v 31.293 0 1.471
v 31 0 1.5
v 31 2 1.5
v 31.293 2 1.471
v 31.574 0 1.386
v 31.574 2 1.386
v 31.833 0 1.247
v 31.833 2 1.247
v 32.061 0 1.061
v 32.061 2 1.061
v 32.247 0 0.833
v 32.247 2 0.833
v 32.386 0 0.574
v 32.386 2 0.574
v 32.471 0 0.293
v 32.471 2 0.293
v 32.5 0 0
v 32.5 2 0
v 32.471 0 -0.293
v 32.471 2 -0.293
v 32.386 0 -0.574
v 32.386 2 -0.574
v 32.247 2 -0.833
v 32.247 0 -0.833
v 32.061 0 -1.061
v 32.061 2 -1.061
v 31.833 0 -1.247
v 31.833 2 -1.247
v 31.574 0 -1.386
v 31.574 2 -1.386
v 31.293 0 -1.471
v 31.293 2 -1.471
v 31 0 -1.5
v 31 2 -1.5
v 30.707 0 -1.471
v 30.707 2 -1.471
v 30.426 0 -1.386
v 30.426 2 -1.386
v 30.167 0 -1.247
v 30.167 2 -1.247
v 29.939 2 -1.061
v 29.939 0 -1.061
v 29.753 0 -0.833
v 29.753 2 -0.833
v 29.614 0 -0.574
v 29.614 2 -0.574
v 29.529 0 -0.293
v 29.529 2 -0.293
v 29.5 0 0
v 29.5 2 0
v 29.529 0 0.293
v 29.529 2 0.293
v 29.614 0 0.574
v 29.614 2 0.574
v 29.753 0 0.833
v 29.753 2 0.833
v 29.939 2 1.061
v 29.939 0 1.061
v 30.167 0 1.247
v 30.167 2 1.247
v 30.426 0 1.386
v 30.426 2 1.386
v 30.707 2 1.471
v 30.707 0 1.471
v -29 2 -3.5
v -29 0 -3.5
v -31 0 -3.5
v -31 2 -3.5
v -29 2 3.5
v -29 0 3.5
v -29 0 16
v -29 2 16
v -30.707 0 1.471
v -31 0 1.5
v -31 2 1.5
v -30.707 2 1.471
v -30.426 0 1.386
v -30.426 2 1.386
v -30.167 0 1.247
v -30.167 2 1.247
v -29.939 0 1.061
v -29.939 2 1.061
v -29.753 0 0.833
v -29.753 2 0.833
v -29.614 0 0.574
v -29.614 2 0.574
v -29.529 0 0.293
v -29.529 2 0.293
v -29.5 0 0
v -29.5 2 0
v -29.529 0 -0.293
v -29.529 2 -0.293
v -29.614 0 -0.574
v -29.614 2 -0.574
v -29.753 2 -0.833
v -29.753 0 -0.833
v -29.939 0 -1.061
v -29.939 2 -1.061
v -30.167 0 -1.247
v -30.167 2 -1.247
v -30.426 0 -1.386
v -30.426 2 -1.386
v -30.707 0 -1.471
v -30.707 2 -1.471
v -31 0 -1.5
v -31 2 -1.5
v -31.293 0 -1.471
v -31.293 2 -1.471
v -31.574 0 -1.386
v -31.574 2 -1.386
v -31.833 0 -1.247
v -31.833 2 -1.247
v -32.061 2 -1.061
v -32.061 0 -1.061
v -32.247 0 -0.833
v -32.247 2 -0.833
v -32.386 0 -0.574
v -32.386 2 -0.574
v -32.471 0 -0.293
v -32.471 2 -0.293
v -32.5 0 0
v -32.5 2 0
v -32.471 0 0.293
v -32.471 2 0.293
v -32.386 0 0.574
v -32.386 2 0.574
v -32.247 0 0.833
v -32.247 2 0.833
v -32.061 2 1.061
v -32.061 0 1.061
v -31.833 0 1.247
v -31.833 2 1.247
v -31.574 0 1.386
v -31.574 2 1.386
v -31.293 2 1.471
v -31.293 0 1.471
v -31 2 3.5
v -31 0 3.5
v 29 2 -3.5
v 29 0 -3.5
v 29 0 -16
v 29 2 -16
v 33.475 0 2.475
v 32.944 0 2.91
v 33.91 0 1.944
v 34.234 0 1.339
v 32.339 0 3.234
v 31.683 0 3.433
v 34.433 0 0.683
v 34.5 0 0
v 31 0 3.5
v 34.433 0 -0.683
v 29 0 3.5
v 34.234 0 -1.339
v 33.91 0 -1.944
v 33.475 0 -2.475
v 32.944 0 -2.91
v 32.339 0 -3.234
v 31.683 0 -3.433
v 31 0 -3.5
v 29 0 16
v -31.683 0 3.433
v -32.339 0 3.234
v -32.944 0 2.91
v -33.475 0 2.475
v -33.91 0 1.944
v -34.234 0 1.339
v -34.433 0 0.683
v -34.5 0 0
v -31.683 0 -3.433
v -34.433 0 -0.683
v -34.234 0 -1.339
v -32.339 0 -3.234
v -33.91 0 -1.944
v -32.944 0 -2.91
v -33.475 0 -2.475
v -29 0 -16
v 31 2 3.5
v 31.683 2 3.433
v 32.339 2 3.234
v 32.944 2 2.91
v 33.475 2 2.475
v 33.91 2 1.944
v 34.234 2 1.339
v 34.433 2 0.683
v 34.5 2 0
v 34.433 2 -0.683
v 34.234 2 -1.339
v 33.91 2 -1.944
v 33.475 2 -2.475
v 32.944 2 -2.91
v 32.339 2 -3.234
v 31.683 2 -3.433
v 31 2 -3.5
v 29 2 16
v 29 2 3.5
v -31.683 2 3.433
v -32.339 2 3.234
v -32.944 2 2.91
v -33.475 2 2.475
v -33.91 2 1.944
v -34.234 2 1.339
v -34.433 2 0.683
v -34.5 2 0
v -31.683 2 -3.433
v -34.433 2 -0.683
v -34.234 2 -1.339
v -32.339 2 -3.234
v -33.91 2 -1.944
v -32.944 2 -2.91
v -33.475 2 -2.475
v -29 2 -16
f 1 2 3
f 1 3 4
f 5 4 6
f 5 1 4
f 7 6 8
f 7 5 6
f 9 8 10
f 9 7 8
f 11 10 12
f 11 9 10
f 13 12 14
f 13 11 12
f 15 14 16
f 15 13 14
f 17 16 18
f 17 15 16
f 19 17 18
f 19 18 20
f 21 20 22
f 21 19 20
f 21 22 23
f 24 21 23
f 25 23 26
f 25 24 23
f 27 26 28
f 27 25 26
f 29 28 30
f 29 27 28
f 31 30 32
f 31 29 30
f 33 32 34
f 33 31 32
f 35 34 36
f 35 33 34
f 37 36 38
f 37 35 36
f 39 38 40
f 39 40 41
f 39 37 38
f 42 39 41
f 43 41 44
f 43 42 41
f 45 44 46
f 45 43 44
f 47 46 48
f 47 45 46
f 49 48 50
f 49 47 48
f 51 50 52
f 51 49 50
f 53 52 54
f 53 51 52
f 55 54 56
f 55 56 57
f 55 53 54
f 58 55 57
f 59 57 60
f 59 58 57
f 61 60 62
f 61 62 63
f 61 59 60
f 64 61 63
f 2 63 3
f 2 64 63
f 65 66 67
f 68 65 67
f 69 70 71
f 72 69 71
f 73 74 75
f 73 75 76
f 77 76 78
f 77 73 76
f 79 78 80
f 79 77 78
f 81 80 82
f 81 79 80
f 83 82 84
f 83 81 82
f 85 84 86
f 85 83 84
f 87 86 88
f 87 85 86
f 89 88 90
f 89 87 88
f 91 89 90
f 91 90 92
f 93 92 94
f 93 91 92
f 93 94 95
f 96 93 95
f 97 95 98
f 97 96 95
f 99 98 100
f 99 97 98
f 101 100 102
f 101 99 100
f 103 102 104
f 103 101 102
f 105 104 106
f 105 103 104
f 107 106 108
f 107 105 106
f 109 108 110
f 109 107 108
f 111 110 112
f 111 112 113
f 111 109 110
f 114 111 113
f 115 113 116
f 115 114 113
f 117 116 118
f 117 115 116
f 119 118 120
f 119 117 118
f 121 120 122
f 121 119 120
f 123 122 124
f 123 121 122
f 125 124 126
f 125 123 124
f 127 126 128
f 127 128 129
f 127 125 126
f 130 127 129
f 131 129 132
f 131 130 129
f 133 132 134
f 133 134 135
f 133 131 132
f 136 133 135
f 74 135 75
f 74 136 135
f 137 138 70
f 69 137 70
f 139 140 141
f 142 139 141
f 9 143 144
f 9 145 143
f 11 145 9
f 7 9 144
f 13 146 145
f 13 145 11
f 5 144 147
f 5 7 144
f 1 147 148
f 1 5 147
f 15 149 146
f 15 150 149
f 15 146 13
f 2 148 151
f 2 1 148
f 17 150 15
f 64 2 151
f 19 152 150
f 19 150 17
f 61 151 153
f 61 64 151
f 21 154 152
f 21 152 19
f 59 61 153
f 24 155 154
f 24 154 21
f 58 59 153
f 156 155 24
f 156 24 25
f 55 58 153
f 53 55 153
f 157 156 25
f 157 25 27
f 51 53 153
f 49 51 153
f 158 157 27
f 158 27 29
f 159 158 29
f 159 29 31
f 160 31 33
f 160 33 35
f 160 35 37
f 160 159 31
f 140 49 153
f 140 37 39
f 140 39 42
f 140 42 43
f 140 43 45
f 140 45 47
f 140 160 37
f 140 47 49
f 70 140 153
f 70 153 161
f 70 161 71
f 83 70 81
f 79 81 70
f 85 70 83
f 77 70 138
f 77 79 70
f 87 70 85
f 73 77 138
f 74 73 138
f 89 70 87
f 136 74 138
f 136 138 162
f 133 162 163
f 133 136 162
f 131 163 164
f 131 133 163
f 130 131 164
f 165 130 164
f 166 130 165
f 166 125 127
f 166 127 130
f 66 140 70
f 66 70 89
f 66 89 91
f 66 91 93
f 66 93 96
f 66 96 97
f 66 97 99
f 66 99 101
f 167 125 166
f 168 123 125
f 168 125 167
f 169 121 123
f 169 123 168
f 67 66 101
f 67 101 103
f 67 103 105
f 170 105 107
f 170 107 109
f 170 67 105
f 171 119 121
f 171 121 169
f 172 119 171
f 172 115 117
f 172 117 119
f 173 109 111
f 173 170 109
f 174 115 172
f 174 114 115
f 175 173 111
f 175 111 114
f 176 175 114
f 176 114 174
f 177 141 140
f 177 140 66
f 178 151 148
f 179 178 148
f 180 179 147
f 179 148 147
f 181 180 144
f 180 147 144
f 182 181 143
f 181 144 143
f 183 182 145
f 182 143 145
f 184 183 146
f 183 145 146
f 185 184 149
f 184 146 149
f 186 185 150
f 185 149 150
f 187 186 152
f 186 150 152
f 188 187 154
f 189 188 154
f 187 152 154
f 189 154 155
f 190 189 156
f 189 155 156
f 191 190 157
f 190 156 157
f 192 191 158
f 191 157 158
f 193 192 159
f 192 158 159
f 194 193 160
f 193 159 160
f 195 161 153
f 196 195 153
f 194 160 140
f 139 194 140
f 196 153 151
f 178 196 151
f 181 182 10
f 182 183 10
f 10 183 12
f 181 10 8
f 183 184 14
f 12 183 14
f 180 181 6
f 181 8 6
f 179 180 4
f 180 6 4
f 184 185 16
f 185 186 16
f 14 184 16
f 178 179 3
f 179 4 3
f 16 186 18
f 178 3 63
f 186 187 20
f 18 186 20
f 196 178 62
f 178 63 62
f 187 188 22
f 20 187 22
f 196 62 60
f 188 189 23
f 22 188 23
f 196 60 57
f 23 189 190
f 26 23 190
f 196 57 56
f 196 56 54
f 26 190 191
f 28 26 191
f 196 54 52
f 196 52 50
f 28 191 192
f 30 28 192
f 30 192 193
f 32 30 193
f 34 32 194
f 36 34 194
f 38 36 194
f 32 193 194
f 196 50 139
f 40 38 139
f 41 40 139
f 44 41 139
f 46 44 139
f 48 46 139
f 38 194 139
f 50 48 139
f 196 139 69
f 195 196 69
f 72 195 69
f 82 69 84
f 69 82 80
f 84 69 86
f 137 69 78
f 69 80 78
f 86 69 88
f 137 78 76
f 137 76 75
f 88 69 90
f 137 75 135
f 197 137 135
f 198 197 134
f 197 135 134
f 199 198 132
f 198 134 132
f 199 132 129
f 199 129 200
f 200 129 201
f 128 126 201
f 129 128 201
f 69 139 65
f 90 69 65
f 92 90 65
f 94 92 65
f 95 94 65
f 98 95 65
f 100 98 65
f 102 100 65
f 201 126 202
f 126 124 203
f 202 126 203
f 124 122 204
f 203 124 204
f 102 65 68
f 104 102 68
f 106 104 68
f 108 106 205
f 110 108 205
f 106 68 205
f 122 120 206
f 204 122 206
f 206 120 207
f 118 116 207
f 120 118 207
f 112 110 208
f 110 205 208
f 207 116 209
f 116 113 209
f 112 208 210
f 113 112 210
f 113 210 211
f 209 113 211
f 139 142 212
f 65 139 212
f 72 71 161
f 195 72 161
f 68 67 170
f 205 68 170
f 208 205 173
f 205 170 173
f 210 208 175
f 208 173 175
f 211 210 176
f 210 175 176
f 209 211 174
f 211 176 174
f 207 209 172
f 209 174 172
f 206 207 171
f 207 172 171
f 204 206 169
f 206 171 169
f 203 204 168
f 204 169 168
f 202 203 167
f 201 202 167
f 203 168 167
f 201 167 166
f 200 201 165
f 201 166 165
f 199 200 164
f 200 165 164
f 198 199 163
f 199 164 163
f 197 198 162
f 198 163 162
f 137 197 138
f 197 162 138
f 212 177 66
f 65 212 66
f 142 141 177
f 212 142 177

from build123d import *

# Parameters (mm, degrees)
CROQUIS1_R              = 1.5
SALIENTE_EXTRUIR1_DEPTH = 2


with BuildPart() as part:
    # Croquis1 → Saliente-Extruir1 (new body)
    # profile 1 of 3: a face of its own
    with BuildSketch(Plane(origin=(0, 0, 0), x_dir=(1, 0, 0), z_dir=(0, 1, 0))):
        Polygon((-29, -16), (-29, 0), (-29, 16), (0, 16), (29, 16), (29, 0), (29, -16), (0, -16), align=None)
    # profile 2 of 3: a face of its own
    with BuildSketch(Plane(origin=(0, 0, 0), x_dir=(1, 0, 0), z_dir=(0, 1, 0))):
        with BuildLine():
            Line((31, 3.5), (29, 3.5))
            Line((29, 3.5), (29, 0))
            Line((29, 0), (29, -3.5))
            Line((29, -3.5), (31, -3.5))
            ThreePointArc((31, -3.5), (34.5, 0), (31, 3.5))
        make_face()
        with Locations(Location((31, 0, 0), (0, 0, 270))):
            Circle(CROQUIS1_R, mode=Mode.SUBTRACT)
    # profile 3 of 3: a face of its own
    with BuildSketch(Plane(origin=(0, 0, 0), x_dir=(1, 0, 0), z_dir=(0, 1, 0))):
        with BuildLine():
            Line((-29, -3.5), (-29, 0))
            Line((-29, 0), (-29, 3.5))
            Line((-29, 3.5), (-31, 3.5))
            ThreePointArc((-31, 3.5), (-34.5, 0), (-31, -3.5))
            Line((-31, -3.5), (-29, -3.5))
        make_face()
        with Locations(Location((-31, 0, 0), (0, 0, 270))):
            Circle(CROQUIS1_R, mode=Mode.SUBTRACT)
    extrude(amount=SALIENTE_EXTRUIR1_DEPTH)


solid = part.part
